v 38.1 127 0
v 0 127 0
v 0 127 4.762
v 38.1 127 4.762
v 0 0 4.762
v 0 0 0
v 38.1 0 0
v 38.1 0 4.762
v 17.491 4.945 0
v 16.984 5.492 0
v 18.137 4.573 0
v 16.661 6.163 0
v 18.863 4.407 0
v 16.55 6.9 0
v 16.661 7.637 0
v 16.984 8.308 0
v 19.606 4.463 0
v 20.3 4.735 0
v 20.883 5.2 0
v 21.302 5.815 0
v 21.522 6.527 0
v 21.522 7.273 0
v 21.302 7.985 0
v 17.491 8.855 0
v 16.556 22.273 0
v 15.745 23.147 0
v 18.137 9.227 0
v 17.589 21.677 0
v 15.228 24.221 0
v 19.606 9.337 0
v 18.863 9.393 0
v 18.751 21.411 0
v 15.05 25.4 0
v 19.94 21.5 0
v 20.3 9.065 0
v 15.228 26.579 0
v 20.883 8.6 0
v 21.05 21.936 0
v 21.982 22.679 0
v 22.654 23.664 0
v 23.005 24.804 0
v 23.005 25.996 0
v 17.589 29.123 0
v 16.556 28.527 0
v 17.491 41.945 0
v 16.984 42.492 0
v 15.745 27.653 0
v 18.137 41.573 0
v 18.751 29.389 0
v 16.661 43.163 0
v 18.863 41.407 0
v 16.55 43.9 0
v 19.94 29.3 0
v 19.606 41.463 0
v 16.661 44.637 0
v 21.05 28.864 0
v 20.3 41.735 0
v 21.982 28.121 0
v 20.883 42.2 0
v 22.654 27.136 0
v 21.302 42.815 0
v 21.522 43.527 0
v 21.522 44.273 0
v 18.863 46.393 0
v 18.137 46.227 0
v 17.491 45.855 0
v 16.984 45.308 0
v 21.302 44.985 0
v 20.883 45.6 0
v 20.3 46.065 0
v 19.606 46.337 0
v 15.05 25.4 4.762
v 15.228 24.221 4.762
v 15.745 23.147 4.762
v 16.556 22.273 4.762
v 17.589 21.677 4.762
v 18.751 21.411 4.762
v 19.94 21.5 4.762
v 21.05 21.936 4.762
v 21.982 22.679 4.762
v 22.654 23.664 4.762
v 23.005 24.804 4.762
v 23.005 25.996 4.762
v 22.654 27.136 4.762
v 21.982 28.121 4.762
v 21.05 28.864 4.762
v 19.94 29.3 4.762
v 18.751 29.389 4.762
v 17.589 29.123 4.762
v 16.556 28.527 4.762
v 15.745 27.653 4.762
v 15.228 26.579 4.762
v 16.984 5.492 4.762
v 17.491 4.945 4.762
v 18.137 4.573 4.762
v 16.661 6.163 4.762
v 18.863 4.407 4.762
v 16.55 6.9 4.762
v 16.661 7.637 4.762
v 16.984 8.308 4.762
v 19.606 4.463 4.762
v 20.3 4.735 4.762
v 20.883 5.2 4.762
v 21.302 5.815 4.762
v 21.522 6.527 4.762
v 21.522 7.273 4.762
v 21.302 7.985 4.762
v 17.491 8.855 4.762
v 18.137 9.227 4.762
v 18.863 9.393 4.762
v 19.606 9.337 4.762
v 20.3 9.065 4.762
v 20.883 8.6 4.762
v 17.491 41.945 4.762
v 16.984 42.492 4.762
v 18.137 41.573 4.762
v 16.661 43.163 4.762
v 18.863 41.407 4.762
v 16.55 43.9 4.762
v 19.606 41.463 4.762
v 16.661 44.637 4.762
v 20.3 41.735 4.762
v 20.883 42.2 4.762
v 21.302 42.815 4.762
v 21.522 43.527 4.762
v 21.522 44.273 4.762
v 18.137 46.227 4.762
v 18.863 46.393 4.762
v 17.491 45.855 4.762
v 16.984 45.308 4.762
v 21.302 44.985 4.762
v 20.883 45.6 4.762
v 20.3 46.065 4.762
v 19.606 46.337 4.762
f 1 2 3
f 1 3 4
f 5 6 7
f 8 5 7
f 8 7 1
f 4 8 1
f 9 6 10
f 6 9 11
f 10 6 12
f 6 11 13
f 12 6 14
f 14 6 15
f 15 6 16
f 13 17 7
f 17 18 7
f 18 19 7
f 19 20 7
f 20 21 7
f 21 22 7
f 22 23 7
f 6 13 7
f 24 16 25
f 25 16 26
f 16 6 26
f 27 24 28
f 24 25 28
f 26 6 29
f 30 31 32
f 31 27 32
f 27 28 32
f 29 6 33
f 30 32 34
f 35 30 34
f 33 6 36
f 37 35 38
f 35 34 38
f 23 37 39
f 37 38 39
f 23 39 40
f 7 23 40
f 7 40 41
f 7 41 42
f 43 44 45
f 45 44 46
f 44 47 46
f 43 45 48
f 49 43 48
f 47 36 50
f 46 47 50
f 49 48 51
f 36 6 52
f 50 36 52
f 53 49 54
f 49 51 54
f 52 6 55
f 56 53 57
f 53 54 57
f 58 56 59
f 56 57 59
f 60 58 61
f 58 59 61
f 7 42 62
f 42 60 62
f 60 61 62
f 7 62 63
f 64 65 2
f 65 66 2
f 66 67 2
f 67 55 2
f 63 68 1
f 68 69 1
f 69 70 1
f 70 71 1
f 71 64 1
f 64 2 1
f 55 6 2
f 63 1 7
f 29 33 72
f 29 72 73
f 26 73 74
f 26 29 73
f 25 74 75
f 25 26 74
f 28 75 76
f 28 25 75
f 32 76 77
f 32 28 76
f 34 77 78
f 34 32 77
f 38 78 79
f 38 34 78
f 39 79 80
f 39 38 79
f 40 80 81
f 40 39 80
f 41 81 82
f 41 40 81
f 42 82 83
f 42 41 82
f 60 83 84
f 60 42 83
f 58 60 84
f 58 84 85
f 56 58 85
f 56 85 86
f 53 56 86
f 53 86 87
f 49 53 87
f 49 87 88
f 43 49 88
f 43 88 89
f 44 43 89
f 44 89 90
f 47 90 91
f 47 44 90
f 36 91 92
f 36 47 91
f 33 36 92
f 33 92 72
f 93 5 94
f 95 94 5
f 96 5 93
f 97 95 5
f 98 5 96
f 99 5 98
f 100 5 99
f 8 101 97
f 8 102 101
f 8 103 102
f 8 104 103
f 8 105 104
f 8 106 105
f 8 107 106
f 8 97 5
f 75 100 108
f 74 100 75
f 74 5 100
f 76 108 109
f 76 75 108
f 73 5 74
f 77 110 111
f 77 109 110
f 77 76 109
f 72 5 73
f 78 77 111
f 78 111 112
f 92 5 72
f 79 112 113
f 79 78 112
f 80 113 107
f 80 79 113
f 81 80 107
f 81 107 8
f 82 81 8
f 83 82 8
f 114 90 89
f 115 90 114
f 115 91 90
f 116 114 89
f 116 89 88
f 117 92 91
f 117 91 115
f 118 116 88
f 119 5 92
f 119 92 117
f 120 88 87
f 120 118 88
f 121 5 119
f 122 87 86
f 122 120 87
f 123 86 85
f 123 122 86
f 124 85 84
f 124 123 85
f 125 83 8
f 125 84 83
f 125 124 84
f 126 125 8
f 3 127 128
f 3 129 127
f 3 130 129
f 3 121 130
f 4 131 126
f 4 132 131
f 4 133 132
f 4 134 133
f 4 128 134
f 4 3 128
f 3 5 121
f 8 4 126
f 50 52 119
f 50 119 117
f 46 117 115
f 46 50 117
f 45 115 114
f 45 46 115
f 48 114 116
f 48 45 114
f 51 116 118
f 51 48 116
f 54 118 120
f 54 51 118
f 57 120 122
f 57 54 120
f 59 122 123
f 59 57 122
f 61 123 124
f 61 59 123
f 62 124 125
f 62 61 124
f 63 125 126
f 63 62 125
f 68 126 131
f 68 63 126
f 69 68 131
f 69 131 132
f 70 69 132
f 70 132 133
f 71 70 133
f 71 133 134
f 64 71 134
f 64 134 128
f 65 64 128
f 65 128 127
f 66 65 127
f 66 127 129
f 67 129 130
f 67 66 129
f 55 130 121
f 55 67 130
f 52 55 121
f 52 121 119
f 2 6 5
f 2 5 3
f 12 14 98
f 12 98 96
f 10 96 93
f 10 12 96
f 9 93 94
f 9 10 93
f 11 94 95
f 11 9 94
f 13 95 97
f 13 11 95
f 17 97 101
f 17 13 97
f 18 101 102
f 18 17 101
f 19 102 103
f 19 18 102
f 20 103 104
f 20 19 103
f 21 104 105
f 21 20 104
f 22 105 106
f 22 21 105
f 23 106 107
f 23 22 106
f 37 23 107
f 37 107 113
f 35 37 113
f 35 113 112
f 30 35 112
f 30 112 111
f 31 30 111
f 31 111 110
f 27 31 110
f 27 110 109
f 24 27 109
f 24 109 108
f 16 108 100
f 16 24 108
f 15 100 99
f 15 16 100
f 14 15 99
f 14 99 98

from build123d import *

# Parameters (mm, degrees)
SKETCH1_W           = 38.1
SKETCH1_H           = 127
SKETCH1_R           = 4
SKETCH1_R_2         = 2.5
BOSS_EXTRUDE1_DEPTH = 4.7625


with BuildPart() as part:
    # Sketch1 → Boss-Extrude1 (new body)
    with BuildSketch(Plane.XY):
        with Locations((19.05, 63.5)):
            Rectangle(SKETCH1_W, SKETCH1_H)
        with Locations(Location((19.05, 25.4, 0), (0, 0, 180))):
            Circle(SKETCH1_R, mode=Mode.SUBTRACT)
        with Locations(Location((19.05, 6.9, 0), (0, 0, 180))):
            Circle(SKETCH1_R_2, mode=Mode.SUBTRACT)
        with Locations(Location((19.05, 43.9, 0), (0, 0, 180))):
            Circle(SKETCH1_R_2, mode=Mode.SUBTRACT)
    extrude(amount=BOSS_EXTRUDE1_DEPTH)


solid = part.part
